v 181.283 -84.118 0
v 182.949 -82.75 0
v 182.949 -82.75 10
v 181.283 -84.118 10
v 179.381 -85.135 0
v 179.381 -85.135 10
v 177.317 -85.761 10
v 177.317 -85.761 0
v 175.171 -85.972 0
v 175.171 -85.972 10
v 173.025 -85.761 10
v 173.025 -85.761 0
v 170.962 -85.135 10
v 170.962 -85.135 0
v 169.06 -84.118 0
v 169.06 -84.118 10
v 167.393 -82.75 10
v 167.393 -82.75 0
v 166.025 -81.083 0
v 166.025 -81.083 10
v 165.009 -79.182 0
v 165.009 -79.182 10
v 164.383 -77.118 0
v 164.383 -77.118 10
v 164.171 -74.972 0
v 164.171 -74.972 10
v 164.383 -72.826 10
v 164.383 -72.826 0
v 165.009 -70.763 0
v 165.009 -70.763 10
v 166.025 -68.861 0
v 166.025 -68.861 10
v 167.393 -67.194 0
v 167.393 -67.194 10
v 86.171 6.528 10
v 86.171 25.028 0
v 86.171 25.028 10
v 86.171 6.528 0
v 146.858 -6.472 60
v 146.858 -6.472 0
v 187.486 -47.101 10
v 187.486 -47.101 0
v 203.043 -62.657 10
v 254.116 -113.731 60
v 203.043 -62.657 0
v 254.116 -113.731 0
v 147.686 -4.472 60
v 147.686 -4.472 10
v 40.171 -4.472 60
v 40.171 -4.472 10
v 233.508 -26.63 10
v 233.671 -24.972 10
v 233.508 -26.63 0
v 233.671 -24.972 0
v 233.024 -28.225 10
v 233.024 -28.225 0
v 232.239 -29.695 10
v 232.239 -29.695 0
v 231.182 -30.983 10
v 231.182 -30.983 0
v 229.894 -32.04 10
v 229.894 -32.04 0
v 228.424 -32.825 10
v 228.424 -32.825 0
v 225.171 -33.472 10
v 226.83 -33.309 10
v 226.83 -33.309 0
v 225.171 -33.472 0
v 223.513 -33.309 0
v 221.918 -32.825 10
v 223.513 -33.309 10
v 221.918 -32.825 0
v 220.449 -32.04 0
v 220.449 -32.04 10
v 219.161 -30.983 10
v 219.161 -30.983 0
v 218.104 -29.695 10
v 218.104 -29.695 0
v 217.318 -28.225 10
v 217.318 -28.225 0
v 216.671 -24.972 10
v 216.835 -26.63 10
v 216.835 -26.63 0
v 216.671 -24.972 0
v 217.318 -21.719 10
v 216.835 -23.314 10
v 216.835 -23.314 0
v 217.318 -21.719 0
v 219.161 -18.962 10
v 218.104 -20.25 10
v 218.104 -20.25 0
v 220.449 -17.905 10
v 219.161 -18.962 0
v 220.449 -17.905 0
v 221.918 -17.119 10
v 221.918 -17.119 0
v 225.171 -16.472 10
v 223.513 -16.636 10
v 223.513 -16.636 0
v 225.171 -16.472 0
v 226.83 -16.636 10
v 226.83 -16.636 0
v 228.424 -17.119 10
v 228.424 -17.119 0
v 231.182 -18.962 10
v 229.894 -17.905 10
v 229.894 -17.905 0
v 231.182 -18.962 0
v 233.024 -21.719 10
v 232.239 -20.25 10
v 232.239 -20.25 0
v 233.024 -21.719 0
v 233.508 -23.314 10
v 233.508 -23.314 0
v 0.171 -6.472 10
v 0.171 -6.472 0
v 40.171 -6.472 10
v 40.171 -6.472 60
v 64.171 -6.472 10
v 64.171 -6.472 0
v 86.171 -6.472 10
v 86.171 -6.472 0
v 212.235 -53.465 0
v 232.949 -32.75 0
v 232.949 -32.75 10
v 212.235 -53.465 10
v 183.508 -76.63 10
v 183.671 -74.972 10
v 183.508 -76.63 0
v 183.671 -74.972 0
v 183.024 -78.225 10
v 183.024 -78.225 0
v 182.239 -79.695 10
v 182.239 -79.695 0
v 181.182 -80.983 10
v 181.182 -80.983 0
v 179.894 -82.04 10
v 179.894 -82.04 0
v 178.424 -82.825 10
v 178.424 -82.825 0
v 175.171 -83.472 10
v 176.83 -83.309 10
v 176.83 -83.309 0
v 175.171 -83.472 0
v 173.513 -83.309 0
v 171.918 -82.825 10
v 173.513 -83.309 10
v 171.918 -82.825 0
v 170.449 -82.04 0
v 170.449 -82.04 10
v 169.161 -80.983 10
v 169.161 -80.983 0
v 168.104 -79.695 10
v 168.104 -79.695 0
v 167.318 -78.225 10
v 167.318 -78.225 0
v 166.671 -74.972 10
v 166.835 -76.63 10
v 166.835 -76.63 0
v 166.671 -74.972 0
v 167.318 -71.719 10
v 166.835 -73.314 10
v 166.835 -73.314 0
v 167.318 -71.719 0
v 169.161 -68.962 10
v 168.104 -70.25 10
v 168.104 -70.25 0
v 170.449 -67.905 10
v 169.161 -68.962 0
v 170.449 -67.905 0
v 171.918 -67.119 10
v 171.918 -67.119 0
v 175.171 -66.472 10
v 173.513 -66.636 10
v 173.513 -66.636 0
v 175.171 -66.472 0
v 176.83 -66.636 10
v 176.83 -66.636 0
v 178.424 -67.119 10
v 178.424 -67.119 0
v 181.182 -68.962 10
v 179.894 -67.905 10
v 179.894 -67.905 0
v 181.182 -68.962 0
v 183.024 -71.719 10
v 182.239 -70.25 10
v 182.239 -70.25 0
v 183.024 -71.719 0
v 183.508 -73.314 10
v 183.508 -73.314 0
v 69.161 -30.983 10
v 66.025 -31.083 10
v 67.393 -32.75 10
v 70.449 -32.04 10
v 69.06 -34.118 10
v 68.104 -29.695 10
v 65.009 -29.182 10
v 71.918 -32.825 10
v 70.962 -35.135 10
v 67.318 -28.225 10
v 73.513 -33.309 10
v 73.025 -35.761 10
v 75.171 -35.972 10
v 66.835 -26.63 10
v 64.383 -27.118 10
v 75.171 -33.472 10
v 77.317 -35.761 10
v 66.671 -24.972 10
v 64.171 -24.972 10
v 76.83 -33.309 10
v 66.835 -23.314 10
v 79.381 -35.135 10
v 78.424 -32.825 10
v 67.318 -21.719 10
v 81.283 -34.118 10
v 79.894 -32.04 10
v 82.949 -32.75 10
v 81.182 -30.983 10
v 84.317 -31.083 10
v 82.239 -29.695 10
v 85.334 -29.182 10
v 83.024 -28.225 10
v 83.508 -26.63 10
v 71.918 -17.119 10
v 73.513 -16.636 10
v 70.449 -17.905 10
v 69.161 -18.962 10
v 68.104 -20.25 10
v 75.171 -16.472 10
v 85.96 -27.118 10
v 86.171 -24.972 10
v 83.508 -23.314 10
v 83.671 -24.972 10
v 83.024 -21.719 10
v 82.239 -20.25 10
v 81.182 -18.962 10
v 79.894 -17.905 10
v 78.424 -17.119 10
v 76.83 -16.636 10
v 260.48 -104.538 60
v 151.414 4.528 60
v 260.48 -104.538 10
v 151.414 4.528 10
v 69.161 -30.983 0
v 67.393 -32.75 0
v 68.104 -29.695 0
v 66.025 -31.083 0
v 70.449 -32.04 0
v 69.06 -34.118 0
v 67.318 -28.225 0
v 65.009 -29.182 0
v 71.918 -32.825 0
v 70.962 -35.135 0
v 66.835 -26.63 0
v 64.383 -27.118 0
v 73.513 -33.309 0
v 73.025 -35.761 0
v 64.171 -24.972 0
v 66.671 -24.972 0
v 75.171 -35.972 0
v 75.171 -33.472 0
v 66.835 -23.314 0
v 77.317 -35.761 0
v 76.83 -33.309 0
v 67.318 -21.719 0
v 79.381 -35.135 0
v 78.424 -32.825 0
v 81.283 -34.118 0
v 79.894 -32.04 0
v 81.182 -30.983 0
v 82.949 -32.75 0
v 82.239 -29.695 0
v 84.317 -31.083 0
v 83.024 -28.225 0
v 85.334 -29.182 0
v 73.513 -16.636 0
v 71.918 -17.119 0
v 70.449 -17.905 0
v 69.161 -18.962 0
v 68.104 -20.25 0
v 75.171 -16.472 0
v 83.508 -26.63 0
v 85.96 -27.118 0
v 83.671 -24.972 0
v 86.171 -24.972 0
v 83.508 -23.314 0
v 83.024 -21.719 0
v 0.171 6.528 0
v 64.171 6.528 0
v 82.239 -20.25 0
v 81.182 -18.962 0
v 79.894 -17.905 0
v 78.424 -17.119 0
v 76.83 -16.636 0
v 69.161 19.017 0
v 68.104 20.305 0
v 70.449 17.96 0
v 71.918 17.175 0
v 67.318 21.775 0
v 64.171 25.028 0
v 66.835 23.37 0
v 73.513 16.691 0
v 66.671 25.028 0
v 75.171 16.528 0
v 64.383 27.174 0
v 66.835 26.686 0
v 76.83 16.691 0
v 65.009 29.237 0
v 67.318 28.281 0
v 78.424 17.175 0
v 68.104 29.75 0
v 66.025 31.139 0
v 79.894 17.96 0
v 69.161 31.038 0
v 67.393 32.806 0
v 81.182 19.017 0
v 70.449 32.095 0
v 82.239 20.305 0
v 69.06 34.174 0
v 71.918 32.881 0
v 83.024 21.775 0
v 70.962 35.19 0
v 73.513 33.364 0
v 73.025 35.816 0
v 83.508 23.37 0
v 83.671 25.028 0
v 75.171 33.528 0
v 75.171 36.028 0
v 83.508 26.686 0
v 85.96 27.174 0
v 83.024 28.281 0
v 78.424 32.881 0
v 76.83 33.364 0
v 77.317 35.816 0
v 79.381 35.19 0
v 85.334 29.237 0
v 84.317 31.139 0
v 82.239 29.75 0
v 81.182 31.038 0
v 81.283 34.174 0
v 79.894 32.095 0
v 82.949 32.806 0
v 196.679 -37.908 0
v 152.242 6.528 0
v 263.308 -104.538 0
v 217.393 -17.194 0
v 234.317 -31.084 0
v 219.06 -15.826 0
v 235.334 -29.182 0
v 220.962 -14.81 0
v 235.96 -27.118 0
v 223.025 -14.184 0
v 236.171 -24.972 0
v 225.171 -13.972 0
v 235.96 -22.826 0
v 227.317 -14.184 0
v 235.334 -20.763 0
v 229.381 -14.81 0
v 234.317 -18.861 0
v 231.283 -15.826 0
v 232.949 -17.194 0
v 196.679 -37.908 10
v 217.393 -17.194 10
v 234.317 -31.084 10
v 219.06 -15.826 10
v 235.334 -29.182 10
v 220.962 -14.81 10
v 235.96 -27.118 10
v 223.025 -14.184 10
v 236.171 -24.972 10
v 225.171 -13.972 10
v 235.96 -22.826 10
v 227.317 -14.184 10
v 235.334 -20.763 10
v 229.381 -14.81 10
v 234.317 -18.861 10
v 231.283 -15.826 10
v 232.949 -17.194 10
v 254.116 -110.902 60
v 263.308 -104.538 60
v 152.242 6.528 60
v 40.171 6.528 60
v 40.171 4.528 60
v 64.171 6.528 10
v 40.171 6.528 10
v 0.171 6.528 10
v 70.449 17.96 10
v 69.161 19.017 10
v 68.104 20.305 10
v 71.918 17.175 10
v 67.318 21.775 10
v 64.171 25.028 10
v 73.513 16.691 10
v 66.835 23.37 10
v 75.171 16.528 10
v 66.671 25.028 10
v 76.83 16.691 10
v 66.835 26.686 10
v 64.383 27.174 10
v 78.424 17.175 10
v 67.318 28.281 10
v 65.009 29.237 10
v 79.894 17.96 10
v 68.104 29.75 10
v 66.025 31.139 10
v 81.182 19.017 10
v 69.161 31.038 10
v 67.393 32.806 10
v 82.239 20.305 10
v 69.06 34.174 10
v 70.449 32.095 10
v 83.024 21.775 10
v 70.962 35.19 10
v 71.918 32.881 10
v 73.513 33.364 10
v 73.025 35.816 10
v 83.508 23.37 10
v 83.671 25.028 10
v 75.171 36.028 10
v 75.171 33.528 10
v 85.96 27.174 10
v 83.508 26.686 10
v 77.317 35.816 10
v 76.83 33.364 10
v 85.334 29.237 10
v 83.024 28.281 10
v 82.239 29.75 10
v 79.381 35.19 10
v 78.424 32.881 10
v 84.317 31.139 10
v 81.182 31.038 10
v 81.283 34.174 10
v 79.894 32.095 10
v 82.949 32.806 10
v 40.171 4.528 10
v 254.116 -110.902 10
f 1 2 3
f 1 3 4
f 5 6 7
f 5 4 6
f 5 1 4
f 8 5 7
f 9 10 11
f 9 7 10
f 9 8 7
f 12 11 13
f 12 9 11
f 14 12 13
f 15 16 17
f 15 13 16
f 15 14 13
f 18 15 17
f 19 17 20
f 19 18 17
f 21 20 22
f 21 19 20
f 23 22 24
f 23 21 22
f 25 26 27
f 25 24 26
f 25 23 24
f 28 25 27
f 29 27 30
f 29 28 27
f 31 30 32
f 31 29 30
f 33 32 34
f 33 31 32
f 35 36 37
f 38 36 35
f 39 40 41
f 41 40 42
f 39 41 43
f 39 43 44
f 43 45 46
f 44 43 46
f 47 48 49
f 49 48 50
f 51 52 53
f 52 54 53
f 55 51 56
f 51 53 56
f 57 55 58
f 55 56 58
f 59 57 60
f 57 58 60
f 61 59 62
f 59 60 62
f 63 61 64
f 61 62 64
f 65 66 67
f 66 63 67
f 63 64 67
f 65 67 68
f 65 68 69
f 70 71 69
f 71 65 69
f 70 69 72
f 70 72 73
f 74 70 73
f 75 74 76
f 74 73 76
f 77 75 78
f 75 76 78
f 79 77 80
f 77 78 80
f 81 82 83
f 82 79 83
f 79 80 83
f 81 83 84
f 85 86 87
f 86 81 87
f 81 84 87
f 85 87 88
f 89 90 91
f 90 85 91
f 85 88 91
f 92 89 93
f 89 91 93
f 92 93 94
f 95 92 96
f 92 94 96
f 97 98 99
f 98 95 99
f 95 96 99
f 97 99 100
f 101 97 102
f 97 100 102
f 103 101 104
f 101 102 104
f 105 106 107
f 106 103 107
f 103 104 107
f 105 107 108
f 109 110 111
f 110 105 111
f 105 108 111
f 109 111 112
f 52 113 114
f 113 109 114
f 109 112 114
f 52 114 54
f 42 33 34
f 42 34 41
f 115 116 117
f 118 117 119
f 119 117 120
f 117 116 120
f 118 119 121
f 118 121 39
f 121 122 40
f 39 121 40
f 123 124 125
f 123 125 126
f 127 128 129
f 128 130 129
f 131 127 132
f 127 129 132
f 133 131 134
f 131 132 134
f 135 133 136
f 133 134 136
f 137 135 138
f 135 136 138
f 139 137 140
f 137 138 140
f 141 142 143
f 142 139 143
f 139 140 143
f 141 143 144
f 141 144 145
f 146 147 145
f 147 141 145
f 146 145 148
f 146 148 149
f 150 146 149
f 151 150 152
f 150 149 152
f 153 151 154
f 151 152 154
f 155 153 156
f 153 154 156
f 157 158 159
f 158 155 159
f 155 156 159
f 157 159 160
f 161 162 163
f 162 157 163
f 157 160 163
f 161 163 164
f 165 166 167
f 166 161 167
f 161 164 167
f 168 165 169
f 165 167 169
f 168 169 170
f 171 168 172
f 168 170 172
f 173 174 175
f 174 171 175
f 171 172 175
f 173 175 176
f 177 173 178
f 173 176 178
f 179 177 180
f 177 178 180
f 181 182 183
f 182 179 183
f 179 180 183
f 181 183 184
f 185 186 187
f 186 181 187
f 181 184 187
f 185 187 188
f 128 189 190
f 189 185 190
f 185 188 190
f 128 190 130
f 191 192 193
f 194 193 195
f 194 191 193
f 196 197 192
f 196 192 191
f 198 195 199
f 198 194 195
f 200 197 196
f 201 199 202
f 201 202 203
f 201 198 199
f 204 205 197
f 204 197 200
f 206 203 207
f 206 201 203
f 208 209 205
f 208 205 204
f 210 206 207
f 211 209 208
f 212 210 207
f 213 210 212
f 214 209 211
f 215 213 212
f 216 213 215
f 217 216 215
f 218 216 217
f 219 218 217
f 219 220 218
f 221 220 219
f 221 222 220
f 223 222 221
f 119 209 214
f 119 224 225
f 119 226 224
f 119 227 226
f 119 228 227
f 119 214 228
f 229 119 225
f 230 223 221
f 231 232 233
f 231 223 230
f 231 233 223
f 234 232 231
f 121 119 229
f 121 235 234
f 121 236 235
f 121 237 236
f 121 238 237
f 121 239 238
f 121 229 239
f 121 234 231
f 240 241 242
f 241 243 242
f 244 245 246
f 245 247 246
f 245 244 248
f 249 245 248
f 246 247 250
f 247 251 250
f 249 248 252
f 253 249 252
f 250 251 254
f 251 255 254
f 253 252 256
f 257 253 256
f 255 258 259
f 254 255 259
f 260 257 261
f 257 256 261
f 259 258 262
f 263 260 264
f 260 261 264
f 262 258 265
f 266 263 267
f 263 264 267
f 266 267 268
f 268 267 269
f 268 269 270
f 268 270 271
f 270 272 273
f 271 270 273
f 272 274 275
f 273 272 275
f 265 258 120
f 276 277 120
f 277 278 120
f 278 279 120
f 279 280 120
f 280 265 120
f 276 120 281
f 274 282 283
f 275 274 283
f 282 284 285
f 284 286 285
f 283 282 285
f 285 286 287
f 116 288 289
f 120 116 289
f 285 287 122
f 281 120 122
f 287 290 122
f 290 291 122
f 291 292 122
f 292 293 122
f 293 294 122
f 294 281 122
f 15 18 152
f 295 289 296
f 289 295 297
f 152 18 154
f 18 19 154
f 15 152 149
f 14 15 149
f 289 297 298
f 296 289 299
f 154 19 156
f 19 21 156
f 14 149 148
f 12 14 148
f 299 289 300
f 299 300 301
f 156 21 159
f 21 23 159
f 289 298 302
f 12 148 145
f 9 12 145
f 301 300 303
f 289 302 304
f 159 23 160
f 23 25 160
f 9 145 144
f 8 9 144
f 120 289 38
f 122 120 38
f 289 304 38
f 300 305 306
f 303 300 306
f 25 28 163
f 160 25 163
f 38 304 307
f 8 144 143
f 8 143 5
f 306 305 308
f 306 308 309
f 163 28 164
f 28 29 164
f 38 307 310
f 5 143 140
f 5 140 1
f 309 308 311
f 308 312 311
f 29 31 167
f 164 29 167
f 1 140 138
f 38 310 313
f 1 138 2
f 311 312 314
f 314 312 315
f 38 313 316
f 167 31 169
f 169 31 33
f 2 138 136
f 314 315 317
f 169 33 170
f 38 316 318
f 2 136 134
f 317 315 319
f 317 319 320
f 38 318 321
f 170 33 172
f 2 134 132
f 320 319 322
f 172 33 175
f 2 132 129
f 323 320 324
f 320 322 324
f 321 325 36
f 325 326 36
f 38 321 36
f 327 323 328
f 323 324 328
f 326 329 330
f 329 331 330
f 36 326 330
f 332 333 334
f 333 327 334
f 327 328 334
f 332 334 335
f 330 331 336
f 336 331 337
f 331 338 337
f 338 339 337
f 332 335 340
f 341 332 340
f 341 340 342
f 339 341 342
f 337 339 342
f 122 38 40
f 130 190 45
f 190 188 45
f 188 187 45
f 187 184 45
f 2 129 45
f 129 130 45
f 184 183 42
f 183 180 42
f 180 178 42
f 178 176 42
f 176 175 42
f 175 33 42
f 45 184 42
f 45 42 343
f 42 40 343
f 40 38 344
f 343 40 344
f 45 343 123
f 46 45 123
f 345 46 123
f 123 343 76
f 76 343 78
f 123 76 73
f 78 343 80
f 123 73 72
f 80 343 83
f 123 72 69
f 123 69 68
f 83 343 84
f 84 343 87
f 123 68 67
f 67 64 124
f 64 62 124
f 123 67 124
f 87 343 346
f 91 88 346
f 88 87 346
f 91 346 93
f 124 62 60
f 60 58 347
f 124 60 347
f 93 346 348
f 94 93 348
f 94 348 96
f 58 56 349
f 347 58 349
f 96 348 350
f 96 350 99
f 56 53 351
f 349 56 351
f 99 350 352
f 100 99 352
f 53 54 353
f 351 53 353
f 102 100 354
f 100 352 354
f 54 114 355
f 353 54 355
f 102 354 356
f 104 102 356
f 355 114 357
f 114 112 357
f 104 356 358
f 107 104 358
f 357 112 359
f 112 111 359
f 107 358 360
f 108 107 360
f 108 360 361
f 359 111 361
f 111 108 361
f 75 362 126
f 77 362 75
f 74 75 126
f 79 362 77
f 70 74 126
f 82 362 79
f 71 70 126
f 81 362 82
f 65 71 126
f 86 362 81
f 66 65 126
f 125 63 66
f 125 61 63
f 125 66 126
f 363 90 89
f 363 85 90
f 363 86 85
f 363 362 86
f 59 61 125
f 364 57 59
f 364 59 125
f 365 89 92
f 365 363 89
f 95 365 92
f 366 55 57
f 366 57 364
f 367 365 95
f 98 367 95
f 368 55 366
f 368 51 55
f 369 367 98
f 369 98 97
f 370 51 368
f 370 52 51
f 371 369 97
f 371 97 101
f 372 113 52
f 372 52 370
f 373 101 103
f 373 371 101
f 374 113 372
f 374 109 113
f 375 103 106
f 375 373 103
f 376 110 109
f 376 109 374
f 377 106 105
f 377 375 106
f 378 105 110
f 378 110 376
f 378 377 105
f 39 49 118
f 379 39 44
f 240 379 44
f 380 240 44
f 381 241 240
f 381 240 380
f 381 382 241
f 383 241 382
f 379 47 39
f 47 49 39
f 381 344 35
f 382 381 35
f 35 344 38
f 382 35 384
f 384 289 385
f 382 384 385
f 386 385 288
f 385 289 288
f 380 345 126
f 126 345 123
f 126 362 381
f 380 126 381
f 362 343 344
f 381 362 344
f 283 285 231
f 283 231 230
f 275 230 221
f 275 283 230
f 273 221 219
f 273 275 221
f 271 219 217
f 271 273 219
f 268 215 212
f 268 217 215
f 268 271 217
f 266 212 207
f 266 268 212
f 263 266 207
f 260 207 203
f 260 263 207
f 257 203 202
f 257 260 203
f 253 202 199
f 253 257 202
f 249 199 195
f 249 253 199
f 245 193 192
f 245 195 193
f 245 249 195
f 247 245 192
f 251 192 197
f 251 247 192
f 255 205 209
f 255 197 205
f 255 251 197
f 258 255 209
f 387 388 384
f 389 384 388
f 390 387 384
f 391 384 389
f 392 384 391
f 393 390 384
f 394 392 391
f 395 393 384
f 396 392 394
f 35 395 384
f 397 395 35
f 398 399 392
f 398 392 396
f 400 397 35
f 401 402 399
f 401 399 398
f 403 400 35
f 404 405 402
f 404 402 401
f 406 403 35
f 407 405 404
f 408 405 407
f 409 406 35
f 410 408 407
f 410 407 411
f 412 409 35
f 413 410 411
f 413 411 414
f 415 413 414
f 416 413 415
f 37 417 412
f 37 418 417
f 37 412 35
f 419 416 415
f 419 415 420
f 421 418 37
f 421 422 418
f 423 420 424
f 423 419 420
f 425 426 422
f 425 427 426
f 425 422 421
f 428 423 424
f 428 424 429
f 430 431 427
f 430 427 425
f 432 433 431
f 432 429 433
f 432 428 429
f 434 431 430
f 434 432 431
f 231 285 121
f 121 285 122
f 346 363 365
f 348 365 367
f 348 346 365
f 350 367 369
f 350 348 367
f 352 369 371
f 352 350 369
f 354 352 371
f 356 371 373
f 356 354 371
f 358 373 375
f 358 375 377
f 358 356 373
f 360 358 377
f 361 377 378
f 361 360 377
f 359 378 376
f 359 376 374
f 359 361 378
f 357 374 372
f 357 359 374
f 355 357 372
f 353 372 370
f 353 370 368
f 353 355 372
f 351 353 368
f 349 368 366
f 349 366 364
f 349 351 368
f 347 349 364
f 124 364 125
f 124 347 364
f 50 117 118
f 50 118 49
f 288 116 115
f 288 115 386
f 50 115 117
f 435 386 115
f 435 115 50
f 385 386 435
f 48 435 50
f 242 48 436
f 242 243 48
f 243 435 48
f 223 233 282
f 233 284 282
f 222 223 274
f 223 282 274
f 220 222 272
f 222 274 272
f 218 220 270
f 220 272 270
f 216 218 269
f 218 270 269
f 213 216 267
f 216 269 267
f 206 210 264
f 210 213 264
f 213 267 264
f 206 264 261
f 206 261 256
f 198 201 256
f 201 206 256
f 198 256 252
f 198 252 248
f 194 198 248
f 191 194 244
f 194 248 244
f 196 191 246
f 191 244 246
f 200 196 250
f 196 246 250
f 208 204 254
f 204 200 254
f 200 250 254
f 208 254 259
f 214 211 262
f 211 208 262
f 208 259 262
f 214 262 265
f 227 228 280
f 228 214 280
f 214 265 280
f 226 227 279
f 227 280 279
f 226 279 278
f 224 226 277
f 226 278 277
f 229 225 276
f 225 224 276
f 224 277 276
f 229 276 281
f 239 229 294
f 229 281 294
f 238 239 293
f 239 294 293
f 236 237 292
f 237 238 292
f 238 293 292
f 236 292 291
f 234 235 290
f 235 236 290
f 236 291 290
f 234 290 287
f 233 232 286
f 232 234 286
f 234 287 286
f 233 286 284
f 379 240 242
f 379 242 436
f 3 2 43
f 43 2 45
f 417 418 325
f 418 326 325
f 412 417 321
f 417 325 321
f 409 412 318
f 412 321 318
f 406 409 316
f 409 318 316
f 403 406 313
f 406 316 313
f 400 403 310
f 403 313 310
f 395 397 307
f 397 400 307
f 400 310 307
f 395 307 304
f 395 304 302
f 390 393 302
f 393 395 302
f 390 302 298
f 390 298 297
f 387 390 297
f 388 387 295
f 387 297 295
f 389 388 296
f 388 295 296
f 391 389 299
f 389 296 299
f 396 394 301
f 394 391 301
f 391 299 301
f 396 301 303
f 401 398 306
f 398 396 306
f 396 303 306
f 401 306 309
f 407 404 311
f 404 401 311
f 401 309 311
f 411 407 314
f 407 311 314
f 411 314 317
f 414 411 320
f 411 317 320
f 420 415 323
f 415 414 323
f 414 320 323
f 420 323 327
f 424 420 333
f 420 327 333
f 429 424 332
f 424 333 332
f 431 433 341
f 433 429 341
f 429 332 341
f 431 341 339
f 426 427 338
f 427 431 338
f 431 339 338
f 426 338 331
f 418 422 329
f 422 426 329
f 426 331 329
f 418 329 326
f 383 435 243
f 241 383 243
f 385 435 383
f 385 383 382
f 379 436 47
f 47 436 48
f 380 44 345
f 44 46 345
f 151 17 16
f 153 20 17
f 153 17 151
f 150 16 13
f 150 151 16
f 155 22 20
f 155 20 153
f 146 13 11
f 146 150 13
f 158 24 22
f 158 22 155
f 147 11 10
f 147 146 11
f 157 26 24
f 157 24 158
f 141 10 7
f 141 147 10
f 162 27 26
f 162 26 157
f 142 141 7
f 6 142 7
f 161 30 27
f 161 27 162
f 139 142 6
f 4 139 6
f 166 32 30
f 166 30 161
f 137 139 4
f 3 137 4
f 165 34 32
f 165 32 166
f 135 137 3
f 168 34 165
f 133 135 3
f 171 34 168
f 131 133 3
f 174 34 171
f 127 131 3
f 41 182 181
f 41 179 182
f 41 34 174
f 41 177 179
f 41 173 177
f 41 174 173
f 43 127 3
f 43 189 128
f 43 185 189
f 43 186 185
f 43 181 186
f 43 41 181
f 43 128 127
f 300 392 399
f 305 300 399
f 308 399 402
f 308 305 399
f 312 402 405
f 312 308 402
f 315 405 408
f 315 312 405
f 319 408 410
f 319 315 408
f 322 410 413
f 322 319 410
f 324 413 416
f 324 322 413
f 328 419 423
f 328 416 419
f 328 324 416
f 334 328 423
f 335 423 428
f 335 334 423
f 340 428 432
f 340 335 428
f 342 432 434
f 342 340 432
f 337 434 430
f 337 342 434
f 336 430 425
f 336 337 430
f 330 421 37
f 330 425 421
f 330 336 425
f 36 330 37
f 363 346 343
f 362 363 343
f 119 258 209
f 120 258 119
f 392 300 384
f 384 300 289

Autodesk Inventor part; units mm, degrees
ref_plane "YZ Plane" through (0, 0, 0) normal (1, 0, 0) x (0, 1, 0)
ref_plane "XZ Plane" through (0, 0, 0) normal (0, 1, 0) x (-1, 0, 0)
ref_plane "XY Plane" through (0, 0, 0) normal (0, 0, 1) x (1, 0, 0)
sketch "Sketch1" plane through (0, 0, 0) normal (0, 0, 1) x (1, 0, 0)
  line L0 (0.1713, 1.5278) -> (0.1713, -1.4722)
  line L1 (0.1713, 1.5278) -> (0.1713, 6.5278)
  line L2 (0.1713, -1.4722) -> (0.1713, -6.4722)
  line L3 (0.1713, -6.4722) -> (146.8575, -6.4722)
  line L4 (152.2423, 6.5278) -> (0.1713, 6.5278)
  line L5 (146.8575, -6.4722) -> (254.1159, -113.7306)
  line L6 (263.3083, -104.5382) -> (152.2423, 6.5278)
  line L7 (254.1159, -113.7306) -> (263.3083, -104.5382)
  line L8 (40.1713, -6.4722) -> (40.1713, -4.4722)
  line L9 (232.9494, -32.7504) -> (212.235, -53.4648)
  circle A0 centre (225.1713, -24.9722) radius 8.5
  circle A1 centre (225.1713, -24.9722) radius 11
  line L10 (217.3931, -17.194) -> (196.6786, -37.9085)
  line L11 (182.9494, -82.7504) -> (203.0426, -62.6572)
  line L12 (167.3931, -67.194) -> (187.4862, -47.1009)
  circle A2 centre (175.1713, -74.9722) radius 8.5
  circle A3 centre (175.1713, -74.9722) radius 11
  line L13 (86.1713, -24.9722) -> (86.1713, -6.4722)
  line L14 (64.1713, -24.9722) -> (64.1713, -6.4722)
  circle A4 centre (75.1713, -24.9722) radius 8.5
  circle A5 centre (75.1713, -24.9722) radius 11
  line L15 (86.1713, 25.0278) -> (86.1713, 6.5278)
  circle A6 centre (75.1713, 25.0278) radius 8.5
  circle A7 centre (75.1713, 25.0278) radius 11
  line L16 (64.1713, 25.0278) -> (64.1713, 6.5278)
  line L17 (40.1713, 4.5278) -> (40.1713, 6.5278)
  line L18 (40.1713, 4.5278) -> (151.4139, 4.5278)
  line L19 (151.4139, 4.5278) -> (260.4799, -104.5382)
  line L20 (260.4799, -104.5382) -> (254.1159, -110.9022)
  line L21 (254.1159, -110.9022) -> (147.686, -4.4722)
  line L22 (147.686, -4.4722) -> (40.1713, -4.4722)
  point P0 (0, 0)
  point P1 (0.1713, 0.0278)
  point P2 (0.1713, 0.0278)
  point P3 (0.1713, -3.9722)
  point P4 (40.1713, -3.9722)
  point P5 (76.2068, 6.5278)
  point P6 (86.1713, 6.5278)
  point P7 (64.1713, 6.5278)
  point P8 (86.1713, -6.4722)
  point P9 (64.1713, -6.4722)
  point P10 (203.0426, -62.6572)
  point P11 (187.4862, -47.1009)
  point P12 (196.6786, -37.9085)
  point P13 (212.235, -53.4648)
extrude "Extrusion4" add sketch "Sketch1" along normal blind 60 contours L4 L6 L7 L5 L3 L8 L22 L21 L20 L19 L18 L17
extrude "Extrusion5" add sketch "Sketch1" along normal blind 10 contours L1 L4 L17 L18 L19 L20 L21 L22 L8 L3 L2 L0 | L16 A7 L15 L4 | L3 L13 A5 L14 | A7 | A5 | L10 A1 L9 L6 | L5 L11 A3 L12 | A1 | A3
properties part number "hold_right_sim"
